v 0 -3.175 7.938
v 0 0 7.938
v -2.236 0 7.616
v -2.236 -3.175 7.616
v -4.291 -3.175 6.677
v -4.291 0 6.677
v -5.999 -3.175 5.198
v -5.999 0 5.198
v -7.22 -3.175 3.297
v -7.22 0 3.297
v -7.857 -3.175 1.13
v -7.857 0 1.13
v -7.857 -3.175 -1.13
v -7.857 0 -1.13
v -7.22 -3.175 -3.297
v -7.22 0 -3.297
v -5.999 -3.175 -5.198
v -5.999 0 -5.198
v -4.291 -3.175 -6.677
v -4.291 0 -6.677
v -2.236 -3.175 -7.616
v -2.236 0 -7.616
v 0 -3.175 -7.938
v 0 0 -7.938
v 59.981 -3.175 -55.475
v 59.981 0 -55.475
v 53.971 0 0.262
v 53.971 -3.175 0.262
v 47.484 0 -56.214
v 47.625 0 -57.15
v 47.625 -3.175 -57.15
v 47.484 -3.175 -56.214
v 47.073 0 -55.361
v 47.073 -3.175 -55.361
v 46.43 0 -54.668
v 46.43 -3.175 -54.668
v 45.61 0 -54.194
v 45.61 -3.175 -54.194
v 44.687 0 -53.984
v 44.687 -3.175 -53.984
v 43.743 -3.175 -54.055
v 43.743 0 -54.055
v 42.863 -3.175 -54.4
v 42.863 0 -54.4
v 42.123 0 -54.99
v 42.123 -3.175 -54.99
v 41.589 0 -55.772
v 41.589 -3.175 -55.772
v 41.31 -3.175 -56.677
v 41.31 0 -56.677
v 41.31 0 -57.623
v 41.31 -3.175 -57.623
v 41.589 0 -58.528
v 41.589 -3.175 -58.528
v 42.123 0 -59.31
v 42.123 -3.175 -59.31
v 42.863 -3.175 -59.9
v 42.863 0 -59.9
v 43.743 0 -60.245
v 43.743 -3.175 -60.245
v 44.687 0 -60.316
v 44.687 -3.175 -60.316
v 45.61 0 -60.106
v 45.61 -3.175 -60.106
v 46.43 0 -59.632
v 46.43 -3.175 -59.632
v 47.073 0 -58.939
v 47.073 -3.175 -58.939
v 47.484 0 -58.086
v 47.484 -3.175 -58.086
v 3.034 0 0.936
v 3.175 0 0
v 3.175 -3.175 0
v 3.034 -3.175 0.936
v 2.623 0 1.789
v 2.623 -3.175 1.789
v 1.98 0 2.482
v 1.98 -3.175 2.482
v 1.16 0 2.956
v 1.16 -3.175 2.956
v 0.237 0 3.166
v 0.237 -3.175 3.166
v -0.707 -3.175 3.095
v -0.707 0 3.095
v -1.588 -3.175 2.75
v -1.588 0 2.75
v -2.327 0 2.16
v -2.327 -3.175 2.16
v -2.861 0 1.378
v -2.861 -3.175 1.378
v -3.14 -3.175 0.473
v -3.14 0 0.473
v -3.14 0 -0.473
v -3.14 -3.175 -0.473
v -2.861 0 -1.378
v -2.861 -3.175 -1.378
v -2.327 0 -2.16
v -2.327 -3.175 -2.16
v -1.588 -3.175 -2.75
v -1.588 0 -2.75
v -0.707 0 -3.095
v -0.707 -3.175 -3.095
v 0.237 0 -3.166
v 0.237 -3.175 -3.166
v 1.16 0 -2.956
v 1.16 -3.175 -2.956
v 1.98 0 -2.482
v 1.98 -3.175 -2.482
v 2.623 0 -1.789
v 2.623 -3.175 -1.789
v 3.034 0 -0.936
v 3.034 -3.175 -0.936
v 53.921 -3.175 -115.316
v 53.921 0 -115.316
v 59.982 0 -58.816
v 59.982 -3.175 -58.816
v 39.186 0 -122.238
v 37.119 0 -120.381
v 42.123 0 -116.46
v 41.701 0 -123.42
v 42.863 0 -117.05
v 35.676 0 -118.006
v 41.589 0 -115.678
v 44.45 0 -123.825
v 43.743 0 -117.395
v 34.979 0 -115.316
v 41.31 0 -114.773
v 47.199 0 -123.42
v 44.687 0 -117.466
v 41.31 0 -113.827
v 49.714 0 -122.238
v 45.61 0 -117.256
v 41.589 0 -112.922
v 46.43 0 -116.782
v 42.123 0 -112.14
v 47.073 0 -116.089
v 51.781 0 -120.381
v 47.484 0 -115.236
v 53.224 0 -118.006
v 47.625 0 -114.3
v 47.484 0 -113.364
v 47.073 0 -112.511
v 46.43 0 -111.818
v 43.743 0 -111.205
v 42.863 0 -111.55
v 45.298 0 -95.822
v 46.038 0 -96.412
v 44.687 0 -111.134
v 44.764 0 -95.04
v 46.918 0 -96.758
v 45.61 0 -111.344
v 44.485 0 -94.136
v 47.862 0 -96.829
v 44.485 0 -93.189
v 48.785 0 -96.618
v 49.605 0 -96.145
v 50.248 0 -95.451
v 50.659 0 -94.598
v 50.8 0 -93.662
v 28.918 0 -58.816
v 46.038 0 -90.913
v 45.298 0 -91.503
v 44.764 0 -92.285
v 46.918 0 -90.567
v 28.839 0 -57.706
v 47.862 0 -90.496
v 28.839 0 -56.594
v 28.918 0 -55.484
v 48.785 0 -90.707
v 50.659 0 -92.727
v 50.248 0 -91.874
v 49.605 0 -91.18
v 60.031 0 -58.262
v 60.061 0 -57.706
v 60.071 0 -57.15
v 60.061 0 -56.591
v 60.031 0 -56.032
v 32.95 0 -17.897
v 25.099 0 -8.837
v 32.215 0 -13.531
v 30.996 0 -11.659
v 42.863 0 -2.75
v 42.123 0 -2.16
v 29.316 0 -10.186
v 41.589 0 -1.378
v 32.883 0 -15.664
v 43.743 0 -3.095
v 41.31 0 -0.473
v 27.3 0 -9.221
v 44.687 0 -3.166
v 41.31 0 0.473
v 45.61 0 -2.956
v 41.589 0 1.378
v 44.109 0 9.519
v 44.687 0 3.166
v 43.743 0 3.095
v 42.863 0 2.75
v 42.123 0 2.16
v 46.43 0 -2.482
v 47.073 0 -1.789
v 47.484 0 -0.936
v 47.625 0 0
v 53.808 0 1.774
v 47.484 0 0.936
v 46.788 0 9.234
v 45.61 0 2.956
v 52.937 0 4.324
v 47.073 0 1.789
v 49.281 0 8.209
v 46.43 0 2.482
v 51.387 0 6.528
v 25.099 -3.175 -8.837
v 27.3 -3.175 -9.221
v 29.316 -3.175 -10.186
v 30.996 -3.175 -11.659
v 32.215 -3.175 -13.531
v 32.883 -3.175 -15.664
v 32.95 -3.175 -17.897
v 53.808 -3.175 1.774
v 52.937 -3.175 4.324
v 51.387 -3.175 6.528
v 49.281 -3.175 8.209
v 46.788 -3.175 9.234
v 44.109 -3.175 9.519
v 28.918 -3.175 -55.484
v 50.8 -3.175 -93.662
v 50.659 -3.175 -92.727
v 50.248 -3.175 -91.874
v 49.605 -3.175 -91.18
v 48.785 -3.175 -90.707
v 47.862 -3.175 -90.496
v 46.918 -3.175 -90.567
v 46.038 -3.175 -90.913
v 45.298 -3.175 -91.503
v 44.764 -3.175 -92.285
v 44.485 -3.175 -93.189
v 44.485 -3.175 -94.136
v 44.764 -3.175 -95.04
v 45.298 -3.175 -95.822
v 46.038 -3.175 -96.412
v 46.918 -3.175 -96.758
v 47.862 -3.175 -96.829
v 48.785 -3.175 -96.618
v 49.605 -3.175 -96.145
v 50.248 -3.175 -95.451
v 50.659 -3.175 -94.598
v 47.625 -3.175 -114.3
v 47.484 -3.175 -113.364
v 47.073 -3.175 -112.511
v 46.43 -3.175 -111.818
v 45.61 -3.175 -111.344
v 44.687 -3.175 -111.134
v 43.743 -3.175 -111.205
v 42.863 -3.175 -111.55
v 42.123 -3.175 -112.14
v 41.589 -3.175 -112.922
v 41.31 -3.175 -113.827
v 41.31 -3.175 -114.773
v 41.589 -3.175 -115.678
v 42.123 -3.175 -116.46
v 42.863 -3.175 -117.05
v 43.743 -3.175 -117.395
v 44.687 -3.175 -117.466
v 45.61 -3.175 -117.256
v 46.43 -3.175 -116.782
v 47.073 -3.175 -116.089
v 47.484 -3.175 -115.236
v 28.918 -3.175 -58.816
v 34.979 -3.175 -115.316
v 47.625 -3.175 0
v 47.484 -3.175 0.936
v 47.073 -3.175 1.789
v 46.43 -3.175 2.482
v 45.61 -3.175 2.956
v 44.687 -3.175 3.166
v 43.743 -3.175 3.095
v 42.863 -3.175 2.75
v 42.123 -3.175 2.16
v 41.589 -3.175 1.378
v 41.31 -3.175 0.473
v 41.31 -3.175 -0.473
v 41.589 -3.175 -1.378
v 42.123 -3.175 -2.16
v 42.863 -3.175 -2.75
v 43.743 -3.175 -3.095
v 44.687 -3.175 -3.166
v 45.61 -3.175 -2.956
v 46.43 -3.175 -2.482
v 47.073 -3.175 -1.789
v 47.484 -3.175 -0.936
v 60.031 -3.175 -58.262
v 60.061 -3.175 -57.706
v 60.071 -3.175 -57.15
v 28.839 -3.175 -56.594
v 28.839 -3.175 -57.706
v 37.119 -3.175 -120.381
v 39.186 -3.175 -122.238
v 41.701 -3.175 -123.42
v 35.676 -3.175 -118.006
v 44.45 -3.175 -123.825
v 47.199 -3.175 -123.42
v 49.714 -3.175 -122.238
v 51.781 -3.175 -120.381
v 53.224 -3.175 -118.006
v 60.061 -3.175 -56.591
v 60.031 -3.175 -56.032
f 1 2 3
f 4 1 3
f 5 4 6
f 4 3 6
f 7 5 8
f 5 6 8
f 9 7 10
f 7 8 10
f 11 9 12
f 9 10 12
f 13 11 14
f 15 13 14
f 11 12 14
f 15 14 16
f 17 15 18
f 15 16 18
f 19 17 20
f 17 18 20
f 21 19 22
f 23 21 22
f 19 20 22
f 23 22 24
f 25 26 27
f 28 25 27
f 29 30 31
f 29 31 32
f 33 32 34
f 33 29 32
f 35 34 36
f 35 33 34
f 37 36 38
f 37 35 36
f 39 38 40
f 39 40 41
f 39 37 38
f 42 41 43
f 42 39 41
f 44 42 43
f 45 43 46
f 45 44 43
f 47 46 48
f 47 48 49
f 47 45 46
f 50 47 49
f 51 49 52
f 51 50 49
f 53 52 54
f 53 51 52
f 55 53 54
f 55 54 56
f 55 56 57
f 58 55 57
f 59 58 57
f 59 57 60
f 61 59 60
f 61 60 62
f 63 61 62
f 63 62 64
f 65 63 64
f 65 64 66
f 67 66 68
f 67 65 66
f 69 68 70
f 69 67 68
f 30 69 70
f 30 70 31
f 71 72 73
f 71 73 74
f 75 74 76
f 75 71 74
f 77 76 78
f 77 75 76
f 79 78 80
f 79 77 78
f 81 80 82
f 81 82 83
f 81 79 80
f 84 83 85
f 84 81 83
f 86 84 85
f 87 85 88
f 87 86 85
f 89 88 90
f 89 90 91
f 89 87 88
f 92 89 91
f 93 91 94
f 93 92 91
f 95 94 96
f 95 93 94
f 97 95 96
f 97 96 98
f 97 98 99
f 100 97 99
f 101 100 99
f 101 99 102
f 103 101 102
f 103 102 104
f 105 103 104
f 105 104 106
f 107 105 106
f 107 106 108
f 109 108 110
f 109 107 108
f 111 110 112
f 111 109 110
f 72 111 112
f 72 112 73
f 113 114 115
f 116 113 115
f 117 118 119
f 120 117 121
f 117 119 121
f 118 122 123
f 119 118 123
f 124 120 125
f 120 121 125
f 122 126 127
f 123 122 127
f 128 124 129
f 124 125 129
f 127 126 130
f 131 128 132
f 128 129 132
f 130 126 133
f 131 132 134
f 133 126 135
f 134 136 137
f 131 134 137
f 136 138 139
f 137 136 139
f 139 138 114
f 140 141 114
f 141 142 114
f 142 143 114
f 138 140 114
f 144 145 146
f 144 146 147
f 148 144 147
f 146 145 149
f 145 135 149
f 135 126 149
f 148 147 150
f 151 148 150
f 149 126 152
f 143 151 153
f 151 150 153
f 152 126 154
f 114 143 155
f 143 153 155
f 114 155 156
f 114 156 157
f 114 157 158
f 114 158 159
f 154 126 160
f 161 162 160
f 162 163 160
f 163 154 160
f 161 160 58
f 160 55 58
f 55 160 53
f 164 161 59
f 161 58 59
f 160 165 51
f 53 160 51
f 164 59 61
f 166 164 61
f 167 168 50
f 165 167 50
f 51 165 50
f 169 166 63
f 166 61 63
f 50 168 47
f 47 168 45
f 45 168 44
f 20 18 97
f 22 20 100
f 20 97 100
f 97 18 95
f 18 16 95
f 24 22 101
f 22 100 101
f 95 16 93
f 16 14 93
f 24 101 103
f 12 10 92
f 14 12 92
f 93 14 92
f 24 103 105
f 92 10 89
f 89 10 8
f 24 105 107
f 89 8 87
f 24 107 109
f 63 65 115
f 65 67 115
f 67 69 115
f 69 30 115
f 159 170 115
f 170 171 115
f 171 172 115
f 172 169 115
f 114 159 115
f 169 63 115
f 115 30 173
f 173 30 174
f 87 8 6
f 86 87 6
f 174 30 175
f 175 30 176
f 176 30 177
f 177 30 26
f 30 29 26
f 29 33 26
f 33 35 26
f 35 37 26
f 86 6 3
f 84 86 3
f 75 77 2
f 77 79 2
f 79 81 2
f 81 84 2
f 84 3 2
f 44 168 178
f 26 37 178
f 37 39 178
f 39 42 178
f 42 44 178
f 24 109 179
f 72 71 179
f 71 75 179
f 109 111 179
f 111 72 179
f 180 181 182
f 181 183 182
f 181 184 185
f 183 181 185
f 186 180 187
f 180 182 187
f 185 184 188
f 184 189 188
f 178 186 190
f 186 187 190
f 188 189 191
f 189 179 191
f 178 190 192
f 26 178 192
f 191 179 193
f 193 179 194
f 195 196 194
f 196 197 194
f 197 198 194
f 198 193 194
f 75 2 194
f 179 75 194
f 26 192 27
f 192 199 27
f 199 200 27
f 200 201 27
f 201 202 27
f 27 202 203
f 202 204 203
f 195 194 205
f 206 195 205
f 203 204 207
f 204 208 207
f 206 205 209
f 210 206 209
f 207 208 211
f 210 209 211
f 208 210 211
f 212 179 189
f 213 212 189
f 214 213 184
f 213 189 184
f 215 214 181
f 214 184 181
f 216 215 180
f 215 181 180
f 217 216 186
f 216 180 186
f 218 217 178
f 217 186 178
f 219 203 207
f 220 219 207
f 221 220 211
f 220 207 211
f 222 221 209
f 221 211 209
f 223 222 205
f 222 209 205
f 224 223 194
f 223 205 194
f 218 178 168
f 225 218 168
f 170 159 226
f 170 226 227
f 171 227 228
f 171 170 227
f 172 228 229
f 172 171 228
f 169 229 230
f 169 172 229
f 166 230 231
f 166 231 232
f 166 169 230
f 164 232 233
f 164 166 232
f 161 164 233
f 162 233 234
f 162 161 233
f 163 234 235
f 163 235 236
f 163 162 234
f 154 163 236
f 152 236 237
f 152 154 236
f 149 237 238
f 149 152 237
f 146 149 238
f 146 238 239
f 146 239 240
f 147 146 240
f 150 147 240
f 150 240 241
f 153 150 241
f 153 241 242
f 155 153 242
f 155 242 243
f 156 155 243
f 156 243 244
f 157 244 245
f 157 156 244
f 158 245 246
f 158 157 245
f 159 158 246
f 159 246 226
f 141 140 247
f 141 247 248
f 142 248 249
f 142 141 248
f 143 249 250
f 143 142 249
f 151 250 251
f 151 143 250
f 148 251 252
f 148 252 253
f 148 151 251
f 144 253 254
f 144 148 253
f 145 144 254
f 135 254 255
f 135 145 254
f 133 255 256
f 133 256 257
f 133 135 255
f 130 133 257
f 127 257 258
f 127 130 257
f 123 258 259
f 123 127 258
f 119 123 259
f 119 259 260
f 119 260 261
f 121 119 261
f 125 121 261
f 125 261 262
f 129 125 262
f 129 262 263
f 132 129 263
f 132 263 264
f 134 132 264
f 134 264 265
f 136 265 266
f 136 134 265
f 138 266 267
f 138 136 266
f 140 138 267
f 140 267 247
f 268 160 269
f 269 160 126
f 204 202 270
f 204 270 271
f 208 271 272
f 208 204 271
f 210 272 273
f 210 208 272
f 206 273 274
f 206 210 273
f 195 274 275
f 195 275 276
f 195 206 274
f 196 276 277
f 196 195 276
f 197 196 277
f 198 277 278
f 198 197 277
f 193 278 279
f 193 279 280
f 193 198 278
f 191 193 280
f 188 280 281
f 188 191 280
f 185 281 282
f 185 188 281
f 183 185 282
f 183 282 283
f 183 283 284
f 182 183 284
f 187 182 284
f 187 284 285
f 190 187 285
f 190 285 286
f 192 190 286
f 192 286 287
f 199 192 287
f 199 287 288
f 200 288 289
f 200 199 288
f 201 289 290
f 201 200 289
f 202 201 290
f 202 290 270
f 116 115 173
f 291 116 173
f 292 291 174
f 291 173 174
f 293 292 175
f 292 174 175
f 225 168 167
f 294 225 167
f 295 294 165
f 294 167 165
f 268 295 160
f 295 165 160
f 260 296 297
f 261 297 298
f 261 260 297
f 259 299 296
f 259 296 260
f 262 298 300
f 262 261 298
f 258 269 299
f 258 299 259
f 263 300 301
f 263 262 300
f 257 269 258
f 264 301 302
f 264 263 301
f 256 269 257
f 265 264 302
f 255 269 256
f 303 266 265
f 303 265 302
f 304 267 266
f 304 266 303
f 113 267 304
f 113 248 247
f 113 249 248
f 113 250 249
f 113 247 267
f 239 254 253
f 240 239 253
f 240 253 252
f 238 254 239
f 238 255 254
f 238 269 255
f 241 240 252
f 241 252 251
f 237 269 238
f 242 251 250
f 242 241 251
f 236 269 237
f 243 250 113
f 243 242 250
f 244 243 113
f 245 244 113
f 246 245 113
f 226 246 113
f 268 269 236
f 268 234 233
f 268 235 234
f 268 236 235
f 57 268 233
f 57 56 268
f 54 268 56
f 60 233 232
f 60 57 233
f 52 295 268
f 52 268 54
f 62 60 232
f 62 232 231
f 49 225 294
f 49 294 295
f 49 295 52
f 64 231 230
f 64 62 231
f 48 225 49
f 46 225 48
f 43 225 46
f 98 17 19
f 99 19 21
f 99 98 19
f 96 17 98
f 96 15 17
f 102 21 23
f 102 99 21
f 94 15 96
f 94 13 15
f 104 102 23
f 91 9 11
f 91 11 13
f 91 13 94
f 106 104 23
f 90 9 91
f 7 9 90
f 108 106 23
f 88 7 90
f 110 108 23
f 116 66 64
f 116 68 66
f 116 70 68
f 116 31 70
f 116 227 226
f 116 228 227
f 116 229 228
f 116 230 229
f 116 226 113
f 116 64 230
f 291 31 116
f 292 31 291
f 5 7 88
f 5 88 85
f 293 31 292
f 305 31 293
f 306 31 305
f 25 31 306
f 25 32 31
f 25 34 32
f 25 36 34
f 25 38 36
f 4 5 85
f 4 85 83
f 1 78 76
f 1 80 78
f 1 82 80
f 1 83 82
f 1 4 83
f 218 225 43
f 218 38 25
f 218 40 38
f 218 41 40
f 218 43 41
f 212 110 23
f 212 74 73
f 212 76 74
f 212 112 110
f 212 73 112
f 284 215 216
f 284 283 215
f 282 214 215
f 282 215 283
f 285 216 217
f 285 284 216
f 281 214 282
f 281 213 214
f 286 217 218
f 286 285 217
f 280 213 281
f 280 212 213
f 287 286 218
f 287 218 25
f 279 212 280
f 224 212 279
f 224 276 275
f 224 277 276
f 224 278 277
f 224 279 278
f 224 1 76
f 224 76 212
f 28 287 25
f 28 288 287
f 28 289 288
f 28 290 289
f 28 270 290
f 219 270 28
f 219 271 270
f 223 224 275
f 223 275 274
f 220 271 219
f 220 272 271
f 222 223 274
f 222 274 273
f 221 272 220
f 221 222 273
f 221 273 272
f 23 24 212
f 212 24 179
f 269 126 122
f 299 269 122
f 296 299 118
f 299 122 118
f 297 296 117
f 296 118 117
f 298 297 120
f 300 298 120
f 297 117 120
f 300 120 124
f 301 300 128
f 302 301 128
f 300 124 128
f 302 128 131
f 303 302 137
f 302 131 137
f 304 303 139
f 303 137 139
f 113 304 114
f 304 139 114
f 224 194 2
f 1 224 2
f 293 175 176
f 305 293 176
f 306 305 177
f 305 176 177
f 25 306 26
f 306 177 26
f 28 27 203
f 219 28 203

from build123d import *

# Parameters (mm, degrees)
F0_R     = 3.175
F1_DEPTH = 3.175


with BuildPart() as f1:
    # F0 (on Front) → F1 (new body)
    with BuildSketch(Plane.XZ):
        with BuildLine():
            ThreePointArc((0, -7.9375), (5.61266, -5.61266), (7.9375, 0))
            ThreePointArc((7.9375, 0), (5.61266, 5.61266), (0, 7.9375))
            ThreePointArc((0, 7.9375), (-7.9375, 0), (0, -7.9375))
        make_face()
        Circle(F0_R, mode=Mode.SUBTRACT)
        with BuildLine():
            ThreePointArc((59.980986, -55.475453), (44.445822, -41.529001), (28.91812, -55.48376))
            ThreePointArc((28.91812, -55.48376), (28.829, -57.15), (28.91812, -58.81624))
            ThreePointArc((28.91812, -58.81624), (44.45, -72.771), (59.98188, -58.81624))
            ThreePointArc((59.98188, -58.81624), (60.048704, -57.984311), (60.071, -57.15))
            ThreePointArc((60.071, -57.15), (60.04848, -56.311518), (59.980986, -55.475453))
        make_face()
        with Locations((44.45, -57.15)):
            Circle(F0_R, mode=Mode.SUBTRACT)
        with BuildLine():
            ThreePointArc((53.808394, 1.773721), (50.393401, 7.443226), (44.108729, 9.518884))
            ThreePointArc((44.108729, 9.518884), (37.836566, -6.854788), (53.975, 0))
            ThreePointArc((53.975, 0), (53.9741, 0.130959), (53.971399, 0.261894))
            Line((53.971399, 0.261894), (53.808394, 1.773721))
        make_face()
        with Locations((44.45, 0)):
            Circle(F0_R, mode=Mode.SUBTRACT)
        with BuildLine():
            ThreePointArc((53.975, -114.3), (43.941274, -104.788595), (34.979342, -115.316))
            ThreePointArc((34.979342, -115.316), (44.45, -123.825), (53.920658, -115.316))
            ThreePointArc((53.920658, -115.316), (53.961405, -114.808726), (53.975, -114.3))
        make_face()
        with Locations((44.45, -114.3)):
            Circle(F0_R, mode=Mode.SUBTRACT)
        with BuildLine():
            ThreePointArc((59.98188, -58.81624), (44.45, -72.771), (28.91812, -58.81624))
            Line((28.91812, -58.81624), (34.979342, -115.316))
            ThreePointArc((34.979342, -115.316), (43.941274, -104.788595), (53.975, -114.3))
            ThreePointArc((53.975, -114.3), (53.961405, -114.808726), (53.920658, -115.316))
            Line((53.920658, -115.316), (59.98188, -58.81624))
        make_face()
        with Locations((47.625, -93.6625)):
            Circle(F0_R, mode=Mode.SUBTRACT)
        with BuildLine():
            ThreePointArc((0, 7.9375), (5.61266, 5.61266), (7.9375, 0))
            ThreePointArc((7.9375, 0), (5.61266, -5.61266), (0, -7.9375))
            Line((0, -7.9375), (25.099068, -8.837351))
            ThreePointArc((25.099068, -8.837351), (30.996049, -11.659012), (32.950342, -17.897351))
            Line((32.950342, -17.897351), (28.91812, -55.48376))
            ThreePointArc((28.91812, -55.48376), (44.445822, -41.529001), (59.980986, -55.475453))
            Line((59.980986, -55.475453), (53.971399, 0.261894))
            ThreePointArc((53.971399, 0.261894), (53.9741, 0.130959), (53.975, 0))
            ThreePointArc((53.975, 0), (37.836566, -6.854788), (44.108729, 9.518884))
            Line((44.108729, 9.518884), (0, 7.9375))
        make_face()
    extrude(amount=F1_DEPTH)


solid = f1.part
